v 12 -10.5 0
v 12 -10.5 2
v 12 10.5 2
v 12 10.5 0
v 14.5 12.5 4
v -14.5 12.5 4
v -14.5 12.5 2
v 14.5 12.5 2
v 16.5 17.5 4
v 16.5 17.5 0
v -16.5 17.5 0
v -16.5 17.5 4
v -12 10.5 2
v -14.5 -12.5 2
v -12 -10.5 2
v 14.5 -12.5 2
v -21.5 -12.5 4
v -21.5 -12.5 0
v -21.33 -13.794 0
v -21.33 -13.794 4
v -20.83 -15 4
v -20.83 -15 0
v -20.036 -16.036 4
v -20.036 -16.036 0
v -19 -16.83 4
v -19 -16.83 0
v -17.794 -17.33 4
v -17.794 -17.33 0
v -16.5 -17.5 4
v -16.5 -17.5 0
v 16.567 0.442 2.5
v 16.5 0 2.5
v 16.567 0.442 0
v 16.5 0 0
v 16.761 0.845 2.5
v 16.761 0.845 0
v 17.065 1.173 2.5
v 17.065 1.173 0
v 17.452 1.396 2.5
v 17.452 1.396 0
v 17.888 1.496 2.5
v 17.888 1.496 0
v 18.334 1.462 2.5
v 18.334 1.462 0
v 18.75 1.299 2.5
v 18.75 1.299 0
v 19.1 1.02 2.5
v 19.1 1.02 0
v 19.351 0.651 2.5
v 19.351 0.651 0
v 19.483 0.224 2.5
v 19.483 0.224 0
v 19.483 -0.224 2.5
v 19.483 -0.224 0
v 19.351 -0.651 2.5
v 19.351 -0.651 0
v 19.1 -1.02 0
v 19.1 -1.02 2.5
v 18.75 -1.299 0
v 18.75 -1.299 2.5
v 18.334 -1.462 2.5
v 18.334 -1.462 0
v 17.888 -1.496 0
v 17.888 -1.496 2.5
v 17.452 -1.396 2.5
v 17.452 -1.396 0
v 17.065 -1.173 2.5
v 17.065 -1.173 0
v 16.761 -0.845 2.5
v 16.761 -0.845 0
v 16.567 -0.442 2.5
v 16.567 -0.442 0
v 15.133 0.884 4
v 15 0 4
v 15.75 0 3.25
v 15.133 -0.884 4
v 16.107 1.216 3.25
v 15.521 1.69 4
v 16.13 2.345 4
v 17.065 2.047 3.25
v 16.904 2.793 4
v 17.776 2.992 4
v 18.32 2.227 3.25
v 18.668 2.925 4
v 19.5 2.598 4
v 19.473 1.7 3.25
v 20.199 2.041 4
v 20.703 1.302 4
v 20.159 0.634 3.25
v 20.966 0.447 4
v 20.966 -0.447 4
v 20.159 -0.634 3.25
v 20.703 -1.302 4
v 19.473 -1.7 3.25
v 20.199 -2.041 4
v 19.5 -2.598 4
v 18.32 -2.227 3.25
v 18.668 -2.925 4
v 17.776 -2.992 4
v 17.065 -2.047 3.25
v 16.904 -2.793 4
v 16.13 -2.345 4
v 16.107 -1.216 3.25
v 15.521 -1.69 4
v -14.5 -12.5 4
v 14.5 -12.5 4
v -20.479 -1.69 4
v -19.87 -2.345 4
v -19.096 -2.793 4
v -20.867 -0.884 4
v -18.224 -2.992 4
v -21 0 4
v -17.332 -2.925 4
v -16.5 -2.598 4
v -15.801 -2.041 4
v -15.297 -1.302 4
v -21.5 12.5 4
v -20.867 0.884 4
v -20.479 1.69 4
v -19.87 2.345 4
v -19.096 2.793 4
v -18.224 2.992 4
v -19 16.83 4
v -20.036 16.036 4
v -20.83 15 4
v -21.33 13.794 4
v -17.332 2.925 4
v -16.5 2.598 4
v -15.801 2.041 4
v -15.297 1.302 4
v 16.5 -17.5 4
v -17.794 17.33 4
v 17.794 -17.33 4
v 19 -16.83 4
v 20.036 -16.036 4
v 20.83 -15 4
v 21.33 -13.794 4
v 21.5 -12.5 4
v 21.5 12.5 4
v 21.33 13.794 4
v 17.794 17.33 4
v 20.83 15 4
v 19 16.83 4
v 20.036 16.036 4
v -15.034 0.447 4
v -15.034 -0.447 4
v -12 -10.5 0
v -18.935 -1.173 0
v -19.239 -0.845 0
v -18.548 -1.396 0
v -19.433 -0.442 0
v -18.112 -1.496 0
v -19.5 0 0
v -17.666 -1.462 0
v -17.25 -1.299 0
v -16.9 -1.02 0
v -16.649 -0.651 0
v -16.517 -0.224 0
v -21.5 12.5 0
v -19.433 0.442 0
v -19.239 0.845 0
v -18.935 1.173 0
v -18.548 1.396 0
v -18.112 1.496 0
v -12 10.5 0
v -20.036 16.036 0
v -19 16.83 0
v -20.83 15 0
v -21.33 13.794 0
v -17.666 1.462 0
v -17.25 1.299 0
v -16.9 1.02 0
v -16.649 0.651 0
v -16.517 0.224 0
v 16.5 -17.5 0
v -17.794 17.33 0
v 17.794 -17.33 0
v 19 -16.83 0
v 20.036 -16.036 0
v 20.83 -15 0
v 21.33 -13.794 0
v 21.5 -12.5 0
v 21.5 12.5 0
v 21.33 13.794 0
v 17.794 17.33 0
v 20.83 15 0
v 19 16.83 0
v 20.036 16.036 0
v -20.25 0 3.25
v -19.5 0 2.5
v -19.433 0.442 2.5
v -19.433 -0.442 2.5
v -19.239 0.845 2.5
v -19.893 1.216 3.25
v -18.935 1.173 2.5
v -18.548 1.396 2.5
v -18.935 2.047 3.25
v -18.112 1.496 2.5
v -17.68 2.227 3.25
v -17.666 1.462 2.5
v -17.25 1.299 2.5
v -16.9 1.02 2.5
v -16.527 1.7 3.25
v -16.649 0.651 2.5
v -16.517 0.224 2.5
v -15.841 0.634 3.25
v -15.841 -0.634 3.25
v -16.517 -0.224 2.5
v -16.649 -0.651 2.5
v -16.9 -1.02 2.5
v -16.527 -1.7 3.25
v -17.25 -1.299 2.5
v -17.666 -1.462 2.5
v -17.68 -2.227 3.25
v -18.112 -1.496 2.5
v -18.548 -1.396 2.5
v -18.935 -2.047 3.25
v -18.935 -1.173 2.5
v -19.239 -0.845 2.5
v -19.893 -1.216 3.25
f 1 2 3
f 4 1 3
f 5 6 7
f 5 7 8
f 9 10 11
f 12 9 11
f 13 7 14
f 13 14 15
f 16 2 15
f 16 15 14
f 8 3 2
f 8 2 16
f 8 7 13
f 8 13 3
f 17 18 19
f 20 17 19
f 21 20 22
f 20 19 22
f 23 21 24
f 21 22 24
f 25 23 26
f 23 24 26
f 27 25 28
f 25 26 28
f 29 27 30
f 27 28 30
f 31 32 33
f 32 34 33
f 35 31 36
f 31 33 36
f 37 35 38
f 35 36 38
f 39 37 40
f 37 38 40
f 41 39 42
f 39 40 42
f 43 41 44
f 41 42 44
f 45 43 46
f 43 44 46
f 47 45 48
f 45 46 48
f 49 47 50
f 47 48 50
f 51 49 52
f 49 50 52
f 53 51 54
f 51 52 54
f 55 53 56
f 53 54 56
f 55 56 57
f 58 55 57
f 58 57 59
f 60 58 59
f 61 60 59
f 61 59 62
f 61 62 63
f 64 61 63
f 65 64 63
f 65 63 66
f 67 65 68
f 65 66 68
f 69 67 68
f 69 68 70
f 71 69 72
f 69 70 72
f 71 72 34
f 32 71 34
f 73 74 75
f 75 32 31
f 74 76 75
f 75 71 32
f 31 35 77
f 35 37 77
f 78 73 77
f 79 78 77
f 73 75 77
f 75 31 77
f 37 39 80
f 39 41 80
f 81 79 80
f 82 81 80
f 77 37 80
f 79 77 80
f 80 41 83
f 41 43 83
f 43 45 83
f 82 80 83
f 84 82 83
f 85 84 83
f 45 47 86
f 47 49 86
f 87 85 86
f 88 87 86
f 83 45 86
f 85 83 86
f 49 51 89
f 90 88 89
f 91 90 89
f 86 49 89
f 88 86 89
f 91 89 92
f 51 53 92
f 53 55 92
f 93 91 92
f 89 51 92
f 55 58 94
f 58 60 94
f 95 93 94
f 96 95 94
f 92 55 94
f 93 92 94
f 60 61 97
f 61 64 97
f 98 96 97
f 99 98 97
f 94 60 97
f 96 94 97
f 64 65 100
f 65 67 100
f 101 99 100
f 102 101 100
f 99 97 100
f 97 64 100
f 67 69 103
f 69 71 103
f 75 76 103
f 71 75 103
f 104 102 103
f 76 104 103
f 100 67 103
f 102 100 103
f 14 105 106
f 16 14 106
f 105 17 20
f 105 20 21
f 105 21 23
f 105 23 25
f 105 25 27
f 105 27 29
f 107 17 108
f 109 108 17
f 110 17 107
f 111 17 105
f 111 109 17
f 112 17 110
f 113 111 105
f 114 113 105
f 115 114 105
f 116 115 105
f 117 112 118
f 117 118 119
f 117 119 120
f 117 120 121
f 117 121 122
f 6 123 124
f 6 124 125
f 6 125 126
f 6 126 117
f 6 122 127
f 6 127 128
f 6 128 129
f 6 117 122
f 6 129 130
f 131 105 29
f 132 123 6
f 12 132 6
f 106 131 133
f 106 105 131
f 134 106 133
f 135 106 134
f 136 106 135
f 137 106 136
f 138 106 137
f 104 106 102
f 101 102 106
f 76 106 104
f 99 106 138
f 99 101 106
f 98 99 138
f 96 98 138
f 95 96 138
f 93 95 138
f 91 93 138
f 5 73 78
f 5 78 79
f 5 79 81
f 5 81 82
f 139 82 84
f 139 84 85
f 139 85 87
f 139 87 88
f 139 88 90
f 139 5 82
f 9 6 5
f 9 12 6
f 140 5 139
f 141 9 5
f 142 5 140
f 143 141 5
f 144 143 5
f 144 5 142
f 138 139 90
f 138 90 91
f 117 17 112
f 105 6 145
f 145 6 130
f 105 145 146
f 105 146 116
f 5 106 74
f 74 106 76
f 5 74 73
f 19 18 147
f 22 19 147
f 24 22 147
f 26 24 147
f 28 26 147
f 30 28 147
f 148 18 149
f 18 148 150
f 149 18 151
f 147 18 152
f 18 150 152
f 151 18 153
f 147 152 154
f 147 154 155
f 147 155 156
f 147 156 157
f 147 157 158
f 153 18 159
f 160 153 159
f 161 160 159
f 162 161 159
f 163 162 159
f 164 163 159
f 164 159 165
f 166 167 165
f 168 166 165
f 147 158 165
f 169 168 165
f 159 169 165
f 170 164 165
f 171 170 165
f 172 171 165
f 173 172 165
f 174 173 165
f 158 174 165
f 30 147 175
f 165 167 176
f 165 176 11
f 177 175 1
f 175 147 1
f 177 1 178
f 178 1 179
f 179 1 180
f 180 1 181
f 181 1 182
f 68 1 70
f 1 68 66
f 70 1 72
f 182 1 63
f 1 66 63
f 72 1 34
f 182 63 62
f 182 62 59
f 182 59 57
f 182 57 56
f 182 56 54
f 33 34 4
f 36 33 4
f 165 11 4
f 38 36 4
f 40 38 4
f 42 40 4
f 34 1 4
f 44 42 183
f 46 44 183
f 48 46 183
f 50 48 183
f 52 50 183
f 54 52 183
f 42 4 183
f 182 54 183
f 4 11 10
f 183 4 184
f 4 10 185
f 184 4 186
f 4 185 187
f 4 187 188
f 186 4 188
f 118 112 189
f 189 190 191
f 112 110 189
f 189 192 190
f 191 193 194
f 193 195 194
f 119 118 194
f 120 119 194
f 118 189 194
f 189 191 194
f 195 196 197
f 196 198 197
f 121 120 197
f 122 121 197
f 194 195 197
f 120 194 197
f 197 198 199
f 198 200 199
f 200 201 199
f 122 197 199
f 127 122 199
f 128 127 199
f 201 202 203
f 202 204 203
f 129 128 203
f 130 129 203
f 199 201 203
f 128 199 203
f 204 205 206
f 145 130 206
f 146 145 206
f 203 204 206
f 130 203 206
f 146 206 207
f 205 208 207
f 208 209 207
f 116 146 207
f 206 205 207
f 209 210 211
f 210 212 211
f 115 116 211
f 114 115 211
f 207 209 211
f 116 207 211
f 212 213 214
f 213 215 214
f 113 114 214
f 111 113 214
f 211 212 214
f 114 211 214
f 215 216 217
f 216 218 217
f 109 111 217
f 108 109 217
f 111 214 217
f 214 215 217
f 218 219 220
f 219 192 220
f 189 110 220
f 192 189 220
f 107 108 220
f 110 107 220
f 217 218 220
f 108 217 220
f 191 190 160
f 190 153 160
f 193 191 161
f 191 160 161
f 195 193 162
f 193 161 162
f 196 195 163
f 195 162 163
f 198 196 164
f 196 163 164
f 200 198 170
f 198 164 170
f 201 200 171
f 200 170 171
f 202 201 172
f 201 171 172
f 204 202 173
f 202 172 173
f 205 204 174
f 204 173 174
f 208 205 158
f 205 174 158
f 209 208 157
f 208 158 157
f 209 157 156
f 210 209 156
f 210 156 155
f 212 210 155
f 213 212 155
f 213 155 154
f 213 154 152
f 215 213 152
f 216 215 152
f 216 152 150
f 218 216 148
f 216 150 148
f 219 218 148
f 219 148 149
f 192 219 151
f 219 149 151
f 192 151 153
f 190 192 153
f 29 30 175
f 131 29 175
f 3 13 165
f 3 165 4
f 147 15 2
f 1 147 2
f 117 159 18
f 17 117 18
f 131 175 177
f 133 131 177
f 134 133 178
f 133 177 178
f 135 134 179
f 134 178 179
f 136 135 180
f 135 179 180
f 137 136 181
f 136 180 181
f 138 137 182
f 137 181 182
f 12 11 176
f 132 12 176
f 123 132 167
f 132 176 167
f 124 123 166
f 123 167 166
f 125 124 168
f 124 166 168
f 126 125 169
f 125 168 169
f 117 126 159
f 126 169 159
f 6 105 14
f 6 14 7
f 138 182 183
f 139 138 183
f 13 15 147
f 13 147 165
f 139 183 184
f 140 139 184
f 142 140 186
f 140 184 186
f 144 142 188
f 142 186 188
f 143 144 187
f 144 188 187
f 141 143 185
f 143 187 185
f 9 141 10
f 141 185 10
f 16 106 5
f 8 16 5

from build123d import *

# Parameters (mm, degrees)
F1_DEPTH       = 4
F2_W           = 29
F2_H           = 25
F3_DEPTH       = 2
F4_W           = 24
F4_H           = 21
F5_DEPTH       = 2
F7_D           = 3
F7_CSINK_D     = 6
F7_CSINK_ANGLE = 90
F8_D           = 3
F8_CSINK_D     = 6
F8_CSINK_ANGLE = 90


with BuildPart() as f1:
    # F0 (on Top) → F1 (new body)
    with BuildSketch(Plane.XY):
        with BuildLine():
            Line((-16.5, -17.5), (16.5, -17.5))
            ThreePointArc((16.5, -17.5), (20.035534, -16.035534), (21.5, -12.5))
            Line((21.5, -12.5), (21.5, 12.5))
            ThreePointArc((21.5, 12.5), (20.035534, 16.035534), (16.5, 17.5))
            Line((16.5, 17.5), (-16.5, 17.5))
            ThreePointArc((-16.5, 17.5), (-20.035534, 16.035534), (-21.5, 12.5))
            Line((-21.5, 12.5), (-21.5, -12.5))
            ThreePointArc((-21.5, -12.5), (-20.035534, -16.035534), (-16.5, -17.5))
        make_face()
    extrude(amount=F1_DEPTH)

    # F2 (on face) → F3 (cut)
    with BuildSketch(Plane.XY.offset(4)):
        Rectangle(F2_W, F2_H)
    extrude(amount=-F3_DEPTH, mode=Mode.SUBTRACT)

    # F4 (on face) → F5 (cut)
    with BuildSketch(Plane.XY.offset(2)):
        Rectangle(F4_W, F4_H)
    extrude(amount=-F5_DEPTH, mode=Mode.SUBTRACT)

    # F7 (through all)
    with Locations(Plane.XY.offset(4)):
        with Locations((-18, 0)):
            CounterSinkHole(F7_D / 2, F7_CSINK_D / 2, counter_sink_angle=F7_CSINK_ANGLE)

    # F8 (through all)
    with Locations(Plane.XY.offset(4)):
        with Locations((18, 0)):
            CounterSinkHole(F8_D / 2, F8_CSINK_D / 2, counter_sink_angle=F8_CSINK_ANGLE)


solid = f1.part
